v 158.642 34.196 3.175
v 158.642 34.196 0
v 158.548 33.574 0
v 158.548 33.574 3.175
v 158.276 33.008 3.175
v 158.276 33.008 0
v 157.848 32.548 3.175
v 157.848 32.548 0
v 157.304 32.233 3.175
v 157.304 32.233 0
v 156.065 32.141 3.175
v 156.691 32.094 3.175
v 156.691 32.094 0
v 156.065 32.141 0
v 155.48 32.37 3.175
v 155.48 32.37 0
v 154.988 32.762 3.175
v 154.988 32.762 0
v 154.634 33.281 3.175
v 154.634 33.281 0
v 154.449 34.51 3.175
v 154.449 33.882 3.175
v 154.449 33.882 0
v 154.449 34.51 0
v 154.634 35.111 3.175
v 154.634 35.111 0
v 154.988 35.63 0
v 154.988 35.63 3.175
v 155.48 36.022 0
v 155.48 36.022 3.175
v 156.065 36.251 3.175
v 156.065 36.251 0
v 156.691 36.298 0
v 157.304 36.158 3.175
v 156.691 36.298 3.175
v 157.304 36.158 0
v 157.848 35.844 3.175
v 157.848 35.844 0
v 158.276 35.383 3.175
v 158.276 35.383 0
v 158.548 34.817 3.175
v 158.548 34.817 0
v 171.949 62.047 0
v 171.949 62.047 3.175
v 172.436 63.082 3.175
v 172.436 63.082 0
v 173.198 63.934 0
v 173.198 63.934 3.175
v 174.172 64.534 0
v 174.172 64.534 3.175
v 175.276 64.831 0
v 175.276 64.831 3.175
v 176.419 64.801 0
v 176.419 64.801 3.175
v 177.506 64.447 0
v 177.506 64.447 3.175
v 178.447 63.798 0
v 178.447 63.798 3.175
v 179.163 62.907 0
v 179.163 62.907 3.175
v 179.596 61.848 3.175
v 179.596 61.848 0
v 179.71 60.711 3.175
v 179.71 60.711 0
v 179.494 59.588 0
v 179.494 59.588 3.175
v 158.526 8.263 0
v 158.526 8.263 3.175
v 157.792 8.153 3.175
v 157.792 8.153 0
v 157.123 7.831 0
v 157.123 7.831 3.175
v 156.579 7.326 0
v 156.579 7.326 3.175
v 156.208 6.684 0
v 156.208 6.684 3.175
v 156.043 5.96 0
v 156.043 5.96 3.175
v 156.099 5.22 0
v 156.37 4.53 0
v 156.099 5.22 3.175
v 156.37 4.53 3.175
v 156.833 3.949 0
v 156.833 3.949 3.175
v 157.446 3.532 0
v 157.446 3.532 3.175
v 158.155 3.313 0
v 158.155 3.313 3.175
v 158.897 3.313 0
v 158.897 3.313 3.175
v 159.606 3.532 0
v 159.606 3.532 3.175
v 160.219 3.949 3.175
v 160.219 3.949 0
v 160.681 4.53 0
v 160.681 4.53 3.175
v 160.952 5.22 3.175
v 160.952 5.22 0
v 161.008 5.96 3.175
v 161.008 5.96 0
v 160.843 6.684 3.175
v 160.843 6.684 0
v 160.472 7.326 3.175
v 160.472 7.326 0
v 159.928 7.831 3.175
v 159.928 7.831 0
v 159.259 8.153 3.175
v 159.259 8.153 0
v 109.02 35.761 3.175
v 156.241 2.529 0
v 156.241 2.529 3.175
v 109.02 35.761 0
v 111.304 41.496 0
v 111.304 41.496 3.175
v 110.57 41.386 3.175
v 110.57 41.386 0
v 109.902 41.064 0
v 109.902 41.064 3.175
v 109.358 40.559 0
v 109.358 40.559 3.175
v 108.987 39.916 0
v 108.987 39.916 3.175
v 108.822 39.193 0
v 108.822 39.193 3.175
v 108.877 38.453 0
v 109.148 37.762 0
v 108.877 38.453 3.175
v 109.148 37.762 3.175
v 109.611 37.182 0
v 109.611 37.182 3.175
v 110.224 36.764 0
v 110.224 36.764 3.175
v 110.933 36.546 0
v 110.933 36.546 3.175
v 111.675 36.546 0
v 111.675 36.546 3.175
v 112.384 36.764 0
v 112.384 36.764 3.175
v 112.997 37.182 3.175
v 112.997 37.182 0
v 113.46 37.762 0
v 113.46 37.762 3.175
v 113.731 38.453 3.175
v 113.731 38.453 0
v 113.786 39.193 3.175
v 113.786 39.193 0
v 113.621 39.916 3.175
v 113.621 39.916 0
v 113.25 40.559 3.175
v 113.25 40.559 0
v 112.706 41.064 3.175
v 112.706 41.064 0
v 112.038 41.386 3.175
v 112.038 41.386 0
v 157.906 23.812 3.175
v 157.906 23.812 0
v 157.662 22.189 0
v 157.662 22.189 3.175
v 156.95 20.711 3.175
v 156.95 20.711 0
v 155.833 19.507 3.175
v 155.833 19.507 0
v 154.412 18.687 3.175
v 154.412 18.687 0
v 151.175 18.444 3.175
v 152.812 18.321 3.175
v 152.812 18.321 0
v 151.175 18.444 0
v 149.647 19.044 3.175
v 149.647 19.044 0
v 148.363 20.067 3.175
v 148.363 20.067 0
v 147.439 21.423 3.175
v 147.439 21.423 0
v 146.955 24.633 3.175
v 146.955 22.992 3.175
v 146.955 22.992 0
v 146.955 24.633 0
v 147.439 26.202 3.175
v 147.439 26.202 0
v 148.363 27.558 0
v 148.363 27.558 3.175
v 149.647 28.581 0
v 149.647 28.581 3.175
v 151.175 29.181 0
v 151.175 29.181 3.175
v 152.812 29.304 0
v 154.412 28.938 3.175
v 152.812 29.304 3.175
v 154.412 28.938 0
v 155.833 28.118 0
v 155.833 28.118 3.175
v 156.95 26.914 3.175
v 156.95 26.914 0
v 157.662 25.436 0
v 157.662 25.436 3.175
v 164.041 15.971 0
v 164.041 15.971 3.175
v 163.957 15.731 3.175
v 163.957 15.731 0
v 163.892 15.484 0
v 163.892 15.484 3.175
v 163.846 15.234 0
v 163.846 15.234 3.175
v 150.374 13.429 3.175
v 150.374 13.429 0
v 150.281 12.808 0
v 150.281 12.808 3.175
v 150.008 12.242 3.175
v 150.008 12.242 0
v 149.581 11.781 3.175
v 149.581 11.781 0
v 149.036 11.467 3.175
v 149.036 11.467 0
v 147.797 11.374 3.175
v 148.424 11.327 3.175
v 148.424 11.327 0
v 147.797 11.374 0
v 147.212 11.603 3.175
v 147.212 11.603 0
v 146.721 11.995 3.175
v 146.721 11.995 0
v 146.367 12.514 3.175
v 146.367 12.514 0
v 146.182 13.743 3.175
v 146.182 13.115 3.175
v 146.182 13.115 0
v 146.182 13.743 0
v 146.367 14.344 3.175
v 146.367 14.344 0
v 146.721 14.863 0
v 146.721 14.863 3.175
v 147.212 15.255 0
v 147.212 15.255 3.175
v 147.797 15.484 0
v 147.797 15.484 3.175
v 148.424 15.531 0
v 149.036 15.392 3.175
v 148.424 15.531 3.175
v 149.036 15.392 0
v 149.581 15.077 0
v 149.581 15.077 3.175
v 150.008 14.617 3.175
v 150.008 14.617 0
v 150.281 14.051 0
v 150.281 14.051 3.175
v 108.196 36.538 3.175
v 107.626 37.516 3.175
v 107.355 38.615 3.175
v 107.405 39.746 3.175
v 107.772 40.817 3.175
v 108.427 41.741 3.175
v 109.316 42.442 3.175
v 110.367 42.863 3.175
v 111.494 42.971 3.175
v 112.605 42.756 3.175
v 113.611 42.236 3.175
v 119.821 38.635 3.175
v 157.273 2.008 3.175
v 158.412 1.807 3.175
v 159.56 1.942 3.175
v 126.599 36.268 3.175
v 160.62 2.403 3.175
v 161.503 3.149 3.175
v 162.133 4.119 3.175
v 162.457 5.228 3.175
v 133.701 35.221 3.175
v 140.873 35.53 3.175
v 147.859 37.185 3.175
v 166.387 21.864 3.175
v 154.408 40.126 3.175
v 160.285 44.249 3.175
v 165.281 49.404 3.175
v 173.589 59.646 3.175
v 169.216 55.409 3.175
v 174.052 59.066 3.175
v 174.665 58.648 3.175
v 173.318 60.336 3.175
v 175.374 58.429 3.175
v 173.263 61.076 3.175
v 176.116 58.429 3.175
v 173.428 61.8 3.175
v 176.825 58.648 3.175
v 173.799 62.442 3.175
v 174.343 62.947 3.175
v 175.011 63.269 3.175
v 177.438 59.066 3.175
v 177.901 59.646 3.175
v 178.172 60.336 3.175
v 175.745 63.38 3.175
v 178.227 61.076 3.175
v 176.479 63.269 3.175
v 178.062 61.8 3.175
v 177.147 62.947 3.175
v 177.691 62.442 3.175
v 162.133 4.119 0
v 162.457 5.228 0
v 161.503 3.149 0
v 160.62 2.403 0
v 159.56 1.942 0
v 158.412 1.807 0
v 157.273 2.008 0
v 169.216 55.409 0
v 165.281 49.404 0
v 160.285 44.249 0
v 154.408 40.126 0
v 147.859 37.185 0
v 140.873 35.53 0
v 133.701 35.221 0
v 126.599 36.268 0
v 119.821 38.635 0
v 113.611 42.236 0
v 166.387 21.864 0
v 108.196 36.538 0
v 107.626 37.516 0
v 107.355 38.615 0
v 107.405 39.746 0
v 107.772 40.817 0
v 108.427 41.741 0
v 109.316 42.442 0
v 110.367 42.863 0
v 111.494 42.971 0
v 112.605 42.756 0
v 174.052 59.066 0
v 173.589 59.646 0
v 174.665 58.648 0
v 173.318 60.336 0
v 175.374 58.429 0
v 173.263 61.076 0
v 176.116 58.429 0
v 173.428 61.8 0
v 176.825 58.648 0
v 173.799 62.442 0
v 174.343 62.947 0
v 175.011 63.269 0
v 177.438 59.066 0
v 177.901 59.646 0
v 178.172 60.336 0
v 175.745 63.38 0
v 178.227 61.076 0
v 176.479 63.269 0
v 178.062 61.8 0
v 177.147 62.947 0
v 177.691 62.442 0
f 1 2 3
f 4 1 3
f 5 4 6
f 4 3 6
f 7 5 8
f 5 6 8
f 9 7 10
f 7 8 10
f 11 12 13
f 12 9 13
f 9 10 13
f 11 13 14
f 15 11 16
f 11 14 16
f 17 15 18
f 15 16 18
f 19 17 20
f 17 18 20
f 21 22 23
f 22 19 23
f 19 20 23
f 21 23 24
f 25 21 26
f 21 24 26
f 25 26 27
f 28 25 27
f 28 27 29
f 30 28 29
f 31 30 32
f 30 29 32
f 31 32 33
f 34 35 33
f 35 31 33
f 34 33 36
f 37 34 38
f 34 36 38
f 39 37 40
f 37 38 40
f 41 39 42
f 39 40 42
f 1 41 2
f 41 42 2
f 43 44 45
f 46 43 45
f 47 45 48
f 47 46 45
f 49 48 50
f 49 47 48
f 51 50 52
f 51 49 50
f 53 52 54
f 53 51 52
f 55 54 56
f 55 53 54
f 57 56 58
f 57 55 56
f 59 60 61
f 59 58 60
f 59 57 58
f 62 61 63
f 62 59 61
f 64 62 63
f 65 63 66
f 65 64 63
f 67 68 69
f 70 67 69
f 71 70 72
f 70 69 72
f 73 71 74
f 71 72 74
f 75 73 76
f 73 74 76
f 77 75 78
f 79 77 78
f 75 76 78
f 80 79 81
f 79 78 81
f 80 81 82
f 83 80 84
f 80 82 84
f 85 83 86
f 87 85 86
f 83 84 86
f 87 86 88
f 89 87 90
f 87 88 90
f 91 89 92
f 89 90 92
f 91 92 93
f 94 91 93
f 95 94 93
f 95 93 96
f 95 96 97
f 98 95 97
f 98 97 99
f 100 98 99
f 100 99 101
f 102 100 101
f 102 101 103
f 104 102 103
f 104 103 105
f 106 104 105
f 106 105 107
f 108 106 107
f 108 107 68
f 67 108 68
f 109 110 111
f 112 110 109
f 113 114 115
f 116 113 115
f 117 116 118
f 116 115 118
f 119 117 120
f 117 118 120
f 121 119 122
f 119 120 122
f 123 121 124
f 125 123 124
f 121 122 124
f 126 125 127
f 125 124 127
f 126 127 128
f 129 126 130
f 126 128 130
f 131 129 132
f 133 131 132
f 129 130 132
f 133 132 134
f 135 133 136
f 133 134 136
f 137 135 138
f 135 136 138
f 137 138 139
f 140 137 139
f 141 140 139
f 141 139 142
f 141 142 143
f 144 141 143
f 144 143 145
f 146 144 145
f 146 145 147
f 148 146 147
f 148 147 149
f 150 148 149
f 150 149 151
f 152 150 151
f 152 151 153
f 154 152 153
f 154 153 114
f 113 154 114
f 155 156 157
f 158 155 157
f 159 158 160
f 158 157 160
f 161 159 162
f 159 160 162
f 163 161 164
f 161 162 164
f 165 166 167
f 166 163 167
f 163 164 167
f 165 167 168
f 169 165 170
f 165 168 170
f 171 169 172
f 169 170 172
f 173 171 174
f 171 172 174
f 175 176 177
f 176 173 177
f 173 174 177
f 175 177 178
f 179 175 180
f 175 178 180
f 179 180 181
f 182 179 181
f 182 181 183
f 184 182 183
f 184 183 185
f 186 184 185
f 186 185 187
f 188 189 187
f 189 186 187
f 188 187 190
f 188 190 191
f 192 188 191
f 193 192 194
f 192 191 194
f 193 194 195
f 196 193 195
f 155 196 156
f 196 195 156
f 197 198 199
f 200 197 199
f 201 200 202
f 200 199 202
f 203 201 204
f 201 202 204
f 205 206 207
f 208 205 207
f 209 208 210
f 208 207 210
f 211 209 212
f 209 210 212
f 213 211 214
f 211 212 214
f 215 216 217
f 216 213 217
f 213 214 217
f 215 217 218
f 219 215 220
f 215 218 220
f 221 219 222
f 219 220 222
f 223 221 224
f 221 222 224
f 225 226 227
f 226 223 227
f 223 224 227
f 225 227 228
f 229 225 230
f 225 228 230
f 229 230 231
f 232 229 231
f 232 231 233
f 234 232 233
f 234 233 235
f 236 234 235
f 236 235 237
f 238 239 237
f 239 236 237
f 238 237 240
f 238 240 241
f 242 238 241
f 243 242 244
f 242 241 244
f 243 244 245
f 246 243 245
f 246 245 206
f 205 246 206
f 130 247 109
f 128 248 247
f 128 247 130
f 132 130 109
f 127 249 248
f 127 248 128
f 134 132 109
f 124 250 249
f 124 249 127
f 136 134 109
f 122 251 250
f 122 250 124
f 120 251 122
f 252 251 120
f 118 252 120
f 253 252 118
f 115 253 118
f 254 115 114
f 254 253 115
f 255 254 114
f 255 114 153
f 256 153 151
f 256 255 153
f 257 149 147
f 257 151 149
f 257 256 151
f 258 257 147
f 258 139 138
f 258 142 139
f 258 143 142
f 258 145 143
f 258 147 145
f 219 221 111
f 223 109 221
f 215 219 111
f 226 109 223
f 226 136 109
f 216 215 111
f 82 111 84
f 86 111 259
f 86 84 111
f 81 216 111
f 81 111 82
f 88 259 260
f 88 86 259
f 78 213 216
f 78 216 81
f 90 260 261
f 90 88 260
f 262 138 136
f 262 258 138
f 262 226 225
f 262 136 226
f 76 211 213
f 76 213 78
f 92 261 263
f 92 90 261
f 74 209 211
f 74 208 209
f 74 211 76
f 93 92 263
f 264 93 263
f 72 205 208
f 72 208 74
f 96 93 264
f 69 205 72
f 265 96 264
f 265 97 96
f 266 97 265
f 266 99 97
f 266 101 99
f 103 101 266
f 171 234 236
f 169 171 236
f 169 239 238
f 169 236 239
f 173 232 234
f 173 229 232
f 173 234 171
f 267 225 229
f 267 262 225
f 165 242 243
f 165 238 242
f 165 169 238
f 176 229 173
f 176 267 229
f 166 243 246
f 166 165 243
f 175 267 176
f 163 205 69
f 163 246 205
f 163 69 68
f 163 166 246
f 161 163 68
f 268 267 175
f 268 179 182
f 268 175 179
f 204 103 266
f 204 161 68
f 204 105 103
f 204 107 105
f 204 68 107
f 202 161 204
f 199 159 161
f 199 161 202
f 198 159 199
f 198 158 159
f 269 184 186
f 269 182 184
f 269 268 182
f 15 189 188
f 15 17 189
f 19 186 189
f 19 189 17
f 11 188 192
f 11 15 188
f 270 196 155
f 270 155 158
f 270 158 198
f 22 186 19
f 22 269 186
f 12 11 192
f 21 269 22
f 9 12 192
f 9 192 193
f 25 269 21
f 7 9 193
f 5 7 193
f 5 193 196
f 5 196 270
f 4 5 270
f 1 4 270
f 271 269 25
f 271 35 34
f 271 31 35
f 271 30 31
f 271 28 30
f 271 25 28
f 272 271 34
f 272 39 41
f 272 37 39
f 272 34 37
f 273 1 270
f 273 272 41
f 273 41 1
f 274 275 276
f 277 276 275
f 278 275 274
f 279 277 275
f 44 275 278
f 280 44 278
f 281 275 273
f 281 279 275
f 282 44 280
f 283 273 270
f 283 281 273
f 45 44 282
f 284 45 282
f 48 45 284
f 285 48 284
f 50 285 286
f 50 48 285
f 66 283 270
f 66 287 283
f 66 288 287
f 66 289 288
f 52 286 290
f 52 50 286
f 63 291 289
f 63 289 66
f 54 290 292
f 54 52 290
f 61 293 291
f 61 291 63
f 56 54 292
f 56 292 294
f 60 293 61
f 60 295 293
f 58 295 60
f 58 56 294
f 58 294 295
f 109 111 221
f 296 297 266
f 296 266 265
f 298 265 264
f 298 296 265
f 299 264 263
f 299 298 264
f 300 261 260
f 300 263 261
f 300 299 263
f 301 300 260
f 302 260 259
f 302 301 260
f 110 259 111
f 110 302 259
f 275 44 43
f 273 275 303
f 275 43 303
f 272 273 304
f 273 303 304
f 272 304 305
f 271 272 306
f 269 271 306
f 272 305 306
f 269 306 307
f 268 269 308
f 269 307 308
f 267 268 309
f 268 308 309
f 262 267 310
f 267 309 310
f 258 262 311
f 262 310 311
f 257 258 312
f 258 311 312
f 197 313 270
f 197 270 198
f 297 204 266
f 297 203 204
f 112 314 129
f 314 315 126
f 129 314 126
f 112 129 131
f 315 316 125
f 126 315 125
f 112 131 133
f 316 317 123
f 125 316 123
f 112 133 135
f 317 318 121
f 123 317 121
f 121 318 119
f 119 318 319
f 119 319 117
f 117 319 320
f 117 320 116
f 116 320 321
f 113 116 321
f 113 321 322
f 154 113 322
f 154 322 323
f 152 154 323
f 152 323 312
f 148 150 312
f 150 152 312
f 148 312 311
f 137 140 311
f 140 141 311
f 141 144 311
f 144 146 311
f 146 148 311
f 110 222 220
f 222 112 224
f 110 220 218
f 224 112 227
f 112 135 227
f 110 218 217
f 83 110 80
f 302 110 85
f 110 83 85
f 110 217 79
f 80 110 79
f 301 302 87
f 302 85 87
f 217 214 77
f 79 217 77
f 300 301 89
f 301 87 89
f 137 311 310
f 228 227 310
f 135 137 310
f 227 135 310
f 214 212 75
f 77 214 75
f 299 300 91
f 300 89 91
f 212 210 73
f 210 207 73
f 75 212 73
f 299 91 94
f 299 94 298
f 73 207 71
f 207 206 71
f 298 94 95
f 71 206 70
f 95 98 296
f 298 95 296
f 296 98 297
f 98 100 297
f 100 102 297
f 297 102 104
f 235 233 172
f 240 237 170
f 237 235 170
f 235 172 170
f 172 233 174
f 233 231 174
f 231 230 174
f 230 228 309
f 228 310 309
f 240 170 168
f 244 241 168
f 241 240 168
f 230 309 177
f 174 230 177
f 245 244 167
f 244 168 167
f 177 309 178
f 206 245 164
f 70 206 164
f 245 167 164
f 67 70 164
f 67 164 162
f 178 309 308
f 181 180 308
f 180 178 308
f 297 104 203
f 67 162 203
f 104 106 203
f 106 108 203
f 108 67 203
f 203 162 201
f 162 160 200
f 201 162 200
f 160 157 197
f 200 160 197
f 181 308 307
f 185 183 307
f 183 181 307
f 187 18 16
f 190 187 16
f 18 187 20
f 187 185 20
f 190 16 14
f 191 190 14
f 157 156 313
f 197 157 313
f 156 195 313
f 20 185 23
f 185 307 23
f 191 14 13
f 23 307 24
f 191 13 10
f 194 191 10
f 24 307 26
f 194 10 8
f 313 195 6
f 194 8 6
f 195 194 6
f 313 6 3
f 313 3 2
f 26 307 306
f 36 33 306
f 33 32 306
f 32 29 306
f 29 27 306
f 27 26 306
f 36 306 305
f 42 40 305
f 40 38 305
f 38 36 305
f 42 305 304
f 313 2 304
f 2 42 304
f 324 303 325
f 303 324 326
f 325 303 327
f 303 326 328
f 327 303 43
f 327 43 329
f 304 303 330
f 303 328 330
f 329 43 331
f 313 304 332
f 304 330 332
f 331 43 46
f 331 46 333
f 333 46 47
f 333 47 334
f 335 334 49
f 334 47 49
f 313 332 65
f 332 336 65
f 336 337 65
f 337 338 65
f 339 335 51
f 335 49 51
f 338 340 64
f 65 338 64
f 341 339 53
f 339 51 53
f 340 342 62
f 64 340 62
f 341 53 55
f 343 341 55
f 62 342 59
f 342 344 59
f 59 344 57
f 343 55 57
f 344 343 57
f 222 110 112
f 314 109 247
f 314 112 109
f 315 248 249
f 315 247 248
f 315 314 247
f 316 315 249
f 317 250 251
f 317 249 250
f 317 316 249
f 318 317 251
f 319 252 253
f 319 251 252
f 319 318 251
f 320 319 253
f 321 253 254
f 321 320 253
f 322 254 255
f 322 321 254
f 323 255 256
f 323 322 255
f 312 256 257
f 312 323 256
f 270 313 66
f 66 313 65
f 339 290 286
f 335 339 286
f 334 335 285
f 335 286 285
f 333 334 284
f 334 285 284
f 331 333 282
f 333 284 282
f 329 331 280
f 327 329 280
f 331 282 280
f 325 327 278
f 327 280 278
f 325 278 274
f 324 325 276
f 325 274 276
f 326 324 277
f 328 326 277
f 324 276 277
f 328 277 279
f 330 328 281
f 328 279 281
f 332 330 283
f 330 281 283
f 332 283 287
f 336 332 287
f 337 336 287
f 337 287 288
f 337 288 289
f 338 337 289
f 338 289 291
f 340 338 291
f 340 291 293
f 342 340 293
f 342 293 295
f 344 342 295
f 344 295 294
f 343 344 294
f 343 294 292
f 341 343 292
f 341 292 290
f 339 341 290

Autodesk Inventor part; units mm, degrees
ref_plane "YZ Plane" through (0, 0, 0) normal (1, 0, 0) x (0, 1, 0)
ref_plane "XZ Plane" through (0, 0, 0) normal (0, 1, 0) x (-1, 0, 0)
ref_plane "XY Plane" through (0, 0, 0) normal (0, 0, 1) x (1, 0, 0)
sketch "Sketch1" plane through (0, 0, 0) normal (0, 0, 1) x (1, 0, 0)
  line L0 (0, 0) -> (304.8, 0) construction
  line L1 (304.8, 0) -> (304.8, 50.8) construction
  line L2 (304.8, 50.8) -> (0, 50.8) construction
  line L3 (0, 50.8) -> (0, 0) construction
  circle A0 centre (152.4, 23.8125) radius 6.35 construction
  circle A1 centre (152.4, 23.8125) radius 34.29 construction
  circle A2 centre (152.4, 23.8125) radius 22.225 construction
  line L4 (152.4, 23.8125) -> (139.52, 61.741) construction
  circle A3 centre (139.52, 61.741) radius 9.525 construction
  circle A4 centre (139.52, 61.741) radius 17.78 construction
  circle A5 centre (91.5619, 85.09) radius 31.75 construction
  circle A6 centre (163.3424, 109.4657) radius 31.75 construction
  line L5 (0, 50.8) -> (0, 53.34) construction
  line L6 (0, 53.34) -> (304.8, 53.34) construction
  line L7 (304.8, 53.34) -> (304.8, 50.8) construction
  circle A7 centre (139.52, 61.741) radius 21.59 construction
  circle A8 centre (152.4, 23.8125) radius 46.99 construction
  circle A9 centre (152.4, 23.8125) radius 50.8 construction
  arc A10 (86.3865, 79.4564) -> (92.4363, 92.6899) centre (91.5619, 85.09) ccw construction
  circle A11 centre (163.3424, 109.4657) radius 7.65 construction
  circle A12 centre (163.3424, 109.4657) radius 9.1 construction
  circle A13 centre (139.52, 61.741) radius 22.9 construction
  line L8 (86.3865, 79.4564) -> (124.0276, 44.8769) construction
  line L9 (170.8782, 108.1486) -> (162.078, 57.7984) construction
  line L10 (92.4363, 92.6899) -> (91.5619, 85.09) construction
  line L11 (91.5619, 85.09) -> (86.3865, 79.4564) construction
  arc A14 (128.9499, 92.8673) -> (131.407, 97.9722) centre (127.6738, 96.6252) ccw
  circle A15 centre (127.6738, 96.6252) radius 7.9375 construction
  line L12 (92.4363, 92.6899) -> (126.7664, 88.7398) construction
  line L13 (133.1953, 90.9229) -> (158.0208, 114.9615) construction
  line L14 (158.0208, 114.9615) -> (163.3424, 109.4657) construction
  line L15 (170.8782, 108.1486) -> (163.3424, 109.4657) construction
  line L16 (139.52, 61.741) -> (127.6738, 96.6252) construction
  line L17 (91.5619, 85.09) -> (163.3424, 109.4657) construction
  line L18 (152.4, 23.8125) -> (91.5619, 85.09) construction
  line L19 (152.4, 23.8125) -> (163.3424, 109.4657) construction
  circle A16 centre (127.6738, 96.6252) radius 9.2075 construction
  circle A17 centre (127.6738, 96.6252) radius 6.1595 construction
  arc A18 (92.4363, 92.6899) -> (86.3865, 79.4564) centre (91.5619, 85.09) ccw construction
  circle A19 centre (163.3424, 109.4657) radius 25.4 construction
  line L20 (104.7627, 113.9656) -> (78.361, 56.2144) construction
  circle A20 centre (91.5619, 85.09) radius 25.4 construction
  line L21 (104.4015, 107.0791) -> (92.7013, 84.5343) construction
  line L22 (81.0012, 61.9895) -> (90.3961, 85.5882) construction
  arc A21 (100.6718, 111.3992) -> (98.9102, 106.9744) centre (99.791, 109.1868) ccw construction
  arc A22 (103.3046, 104.9655) -> (105.4983, 109.1926) centre (104.4015, 107.0791) ccw construction
  arc A23 (103.3046, 104.9655) -> (98.9102, 106.9744) centre (81.0012, 61.9895) ccw construction
  line L23 (99.791, 109.1868) -> (100.6718, 111.3992) construction
  line L24 (104.4015, 107.0791) -> (105.4983, 109.1926) construction
  arc A24 (105.4983, 109.1926) -> (100.6718, 111.3992) centre (81.0012, 61.9895) ccw construction
  arc A25 (88.0213, 75.5164) -> (97.3814, 93.5522) centre (92.7013, 84.5343) ccw construction
  line L25 (90.3961, 85.5882) -> (99.791, 109.1868) construction
  line L26 (92.7013, 84.5343) -> (81.0012, 61.9895) construction
  arc A26 (88.0213, 75.5164) -> (86.6381, 76.1487) centre (81.0012, 61.9895) ccw construction
  arc A27 (97.3814, 93.5522) -> (94.1541, 95.0276) centre (81.0012, 61.9895) ccw construction
  arc A28 (94.1541, 95.0276) -> (86.6381, 76.1487) centre (90.3961, 85.5882) ccw construction
  line L27 (163.3424, 109.4657) -> (140.8985, 121.3583) construction
  line L28 (163.3424, 109.4657) -> (185.7862, 97.5731) construction
  circle A29 centre (139.52, 61.741) radius 26.71 construction
  circle A30 centre (152.4, 23.8125) radius 11.176 construction
  line L29 (152.4, 23.8125) -> (158.5256, 5.7742) construction
  circle A31 centre (152.4, 23.8125) radius 5.5065
  line L30 (156.5338, 34.1959) -> (148.2662, 13.4291) construction
  circle A32 centre (156.5338, 34.1959) radius 2.1082
  circle A33 centre (148.2662, 13.4291) radius 2.1082
  arc A34 (166.3874, 21.8643) -> (163.8992, 15.6142) centre (152.4, 23.8125) ccw
  circle A35 centre (111.304, 39.007) radius 9.525 construction
  circle A36 centre (175.745, 60.8903) radius 9.525 construction
  arc A37 (113.6108, 42.2365) -> (109.0199, 35.7614) centre (111.304, 39.007) ccw
  arc A38 (179.4939, 59.5878) -> (171.9486, 62.0473) centre (175.745, 60.8903) ccw
  arc A39 (157.2494, 9.5322) -> (156.2414, 2.5286) centre (158.5256, 5.7742) ccw
  line L31 (152.4, 23.8125) -> (165.1433, 18.7393) construction
  line L32 (166.3874, 21.8643) -> (163.8992, 15.6142)
  arc A40 (163.8992, 15.6142) -> (166.3874, 21.8643) centre (152.4, 23.8125) ccw construction
  line L33 (163.8992, 15.6142) -> (162.4566, 5.2282)
  line L34 (156.2414, 2.5286) -> (109.0199, 35.7614)
  line L35 (166.3874, 21.8643) -> (179.4939, 59.5878)
  arc A41 (123.8923, 95.4203) -> (128.9499, 92.8673) centre (127.6738, 96.6252) ccw
  arc A42 (131.407, 97.9722) -> (123.8923, 95.4203) centre (127.6738, 96.6252) ccw
  arc A43 (131.202, 98.5513) -> (131.407, 97.9722) centre (178.6686, 115.0239) ccw
  arc A44 (162.4566, 5.2282) -> (157.2494, 9.5322) centre (158.5256, 5.7742) ccw
  arc A45 (156.2414, 2.5286) -> (162.4566, 5.2282) centre (158.5256, 5.7742) ccw
  circle A46 centre (135.6607, 73.1057) radius 37.9355
  point P0 (102.1225, 108.1905)
  point P1 (145.0256, 46.8513)
  dimension "d1" = 50.8
  dimension "d3" = 23.8125
  dimension "d4" = 152.4
  dimension "d7" = 68.58
  dimension "d8" = 44.45
  dimension "d9" = 19.05
  dimension "d10" = 35.56
  dimension "d11" = 40.0558
  dimension "d12" = 63.5
  dimension "d13" = 63.5
  dimension "d15" = 2.54
  dimension "d16" = 304.8
  dimension "d17" = 43.18
  dimension "d18" = 93.98
  dimension "d19" = 101.6
  dimension "d21" = 15.3
  dimension "d22" = 15.3
  dimension "d24" = 18.2
  dimension "d29" = 45.8
  dimension "d30" = 143.991
  dimension "d31" = 7.9375
  dimension "d32" = 15.875
  dimension "d33" = 143.991
  dimension "d35" = 18.415
  dimension "d37" = 12.319
  dimension "d40" = 50.8
  dimension "d42" = 18.004
  dimension "d43" = 18.004
  dimension "d44" = 50.8
  dimension "d75" = 2.86
  dimension "d80" = 4.7625
  dimension "d82" = 4.7625
  dimension "d83" = 50.8
  dimension "d84" = 50.8
  dimension "d97" = 48.4188
  dimension "d99" = 20.32
  dimension "d101" = 25.4
  dimension "d102" = 25.4
  dimension "d103" = 10.16
  dimension "d105" = 18.004
  dimension "d106" = 18.004
  dimension "d107" = 53.42
  dimension "d149" = 22.352
  dimension "d152" = 180
  dimension "d163" = 11.013
  dimension "d190" = 12.7
  dimension "d191" = 4.2164
  dimension "d192" = 4.2164
  dimension "d209" = 28.2448
  dimension "d210" = 19.05
  dimension "d211" = 19.05
  dimension "d212" = 7.9375
  dimension "d214" = 19.05
  dimension "d215" = 7.9375
  dimension "d216" = 13.716
  dimension "d232" = 3.9688
extrude "Extrusion3" add sketch "Sketch1" along normal blind 3.175 contours L32 A34 | A34 A46 A38 L35 | A34 L33 A44 A39 L34 A37 A46 | A45 A39 A44
hole "Hole3" at (81.0012, 61.9895, 0) at (185.7862, 97.5731, 0) at (127.6738, 96.6252, 0) at (111.304, 39.007, 0) at (175.745, 60.8903, 0) at (158.5256, 5.7742, 0) direction (0, 0, 1) diameter 4.9784 end through all clearance for "Socket Head Cap Screw" size "#10" standard "Ansi Unified Screw Threads"
fillet "Fillet3" radius 3.175 2 edges at (166.3874, 21.8643, 1.5875) (163.8992, 15.6142, 1.5875)
equation "\"d8\" = Gear35tPD"
equation "\"d9\" = Gear15tPD"
equation "\"d10\" = Gear28tPD"
equation "\"d11\" = 0.5 * Gear48tPD + 0.5 * Gear15tPD + MeshingClearance"
equation "\"d12\" = CimOD"
equation "\"d13\" = CimOD"
equation "\"d17\" = Gear28tPD + ClearanceDiameter"
equation "\"d18\" = WheelOD"
equation "\"d19\" = WheelClearance"
equation "\"Pulley48tPD\" = 45.8"
equation "\"Pulley19tPD\" = 18.2"
equation "\"Pulley16tPD\" = 15.3"
equation "\"Gear15tPD\" = 19.05"
equation "\"Gear35tPD\" = 44.45"
equation "\"Gear48tPD\" = 60.96"
equation "\"Gear28tPD\" = 35.56"
equation "\"BearingLargeOD\" = 28.575"
equation "\"BearingSmallOD\" = 22.225"
equation "\"MeshingClearance\" = 0.0508"
equation "\"CimOD\" = 63.5"
equation "\"WheelOD\" = 93.98"
equation "\"ClearanceDiameter\" = 7.62"
equation "\"WheelClearance\" = 101.6"
equation "\"TensioningBearingID\" = 6.35"
equation "\"TensioningBearingOD\" = 15.875"
equation "\"SpingClipClearance\" = 8.89"
equation "\"Pi\" = 79.79645"
equation "\"Pulley56tPD\" = 53.5"
equation "\"BearingXLargeOD\" = 34.925"
properties part number "OutlineSketch1" material "Aluminum 6061"
